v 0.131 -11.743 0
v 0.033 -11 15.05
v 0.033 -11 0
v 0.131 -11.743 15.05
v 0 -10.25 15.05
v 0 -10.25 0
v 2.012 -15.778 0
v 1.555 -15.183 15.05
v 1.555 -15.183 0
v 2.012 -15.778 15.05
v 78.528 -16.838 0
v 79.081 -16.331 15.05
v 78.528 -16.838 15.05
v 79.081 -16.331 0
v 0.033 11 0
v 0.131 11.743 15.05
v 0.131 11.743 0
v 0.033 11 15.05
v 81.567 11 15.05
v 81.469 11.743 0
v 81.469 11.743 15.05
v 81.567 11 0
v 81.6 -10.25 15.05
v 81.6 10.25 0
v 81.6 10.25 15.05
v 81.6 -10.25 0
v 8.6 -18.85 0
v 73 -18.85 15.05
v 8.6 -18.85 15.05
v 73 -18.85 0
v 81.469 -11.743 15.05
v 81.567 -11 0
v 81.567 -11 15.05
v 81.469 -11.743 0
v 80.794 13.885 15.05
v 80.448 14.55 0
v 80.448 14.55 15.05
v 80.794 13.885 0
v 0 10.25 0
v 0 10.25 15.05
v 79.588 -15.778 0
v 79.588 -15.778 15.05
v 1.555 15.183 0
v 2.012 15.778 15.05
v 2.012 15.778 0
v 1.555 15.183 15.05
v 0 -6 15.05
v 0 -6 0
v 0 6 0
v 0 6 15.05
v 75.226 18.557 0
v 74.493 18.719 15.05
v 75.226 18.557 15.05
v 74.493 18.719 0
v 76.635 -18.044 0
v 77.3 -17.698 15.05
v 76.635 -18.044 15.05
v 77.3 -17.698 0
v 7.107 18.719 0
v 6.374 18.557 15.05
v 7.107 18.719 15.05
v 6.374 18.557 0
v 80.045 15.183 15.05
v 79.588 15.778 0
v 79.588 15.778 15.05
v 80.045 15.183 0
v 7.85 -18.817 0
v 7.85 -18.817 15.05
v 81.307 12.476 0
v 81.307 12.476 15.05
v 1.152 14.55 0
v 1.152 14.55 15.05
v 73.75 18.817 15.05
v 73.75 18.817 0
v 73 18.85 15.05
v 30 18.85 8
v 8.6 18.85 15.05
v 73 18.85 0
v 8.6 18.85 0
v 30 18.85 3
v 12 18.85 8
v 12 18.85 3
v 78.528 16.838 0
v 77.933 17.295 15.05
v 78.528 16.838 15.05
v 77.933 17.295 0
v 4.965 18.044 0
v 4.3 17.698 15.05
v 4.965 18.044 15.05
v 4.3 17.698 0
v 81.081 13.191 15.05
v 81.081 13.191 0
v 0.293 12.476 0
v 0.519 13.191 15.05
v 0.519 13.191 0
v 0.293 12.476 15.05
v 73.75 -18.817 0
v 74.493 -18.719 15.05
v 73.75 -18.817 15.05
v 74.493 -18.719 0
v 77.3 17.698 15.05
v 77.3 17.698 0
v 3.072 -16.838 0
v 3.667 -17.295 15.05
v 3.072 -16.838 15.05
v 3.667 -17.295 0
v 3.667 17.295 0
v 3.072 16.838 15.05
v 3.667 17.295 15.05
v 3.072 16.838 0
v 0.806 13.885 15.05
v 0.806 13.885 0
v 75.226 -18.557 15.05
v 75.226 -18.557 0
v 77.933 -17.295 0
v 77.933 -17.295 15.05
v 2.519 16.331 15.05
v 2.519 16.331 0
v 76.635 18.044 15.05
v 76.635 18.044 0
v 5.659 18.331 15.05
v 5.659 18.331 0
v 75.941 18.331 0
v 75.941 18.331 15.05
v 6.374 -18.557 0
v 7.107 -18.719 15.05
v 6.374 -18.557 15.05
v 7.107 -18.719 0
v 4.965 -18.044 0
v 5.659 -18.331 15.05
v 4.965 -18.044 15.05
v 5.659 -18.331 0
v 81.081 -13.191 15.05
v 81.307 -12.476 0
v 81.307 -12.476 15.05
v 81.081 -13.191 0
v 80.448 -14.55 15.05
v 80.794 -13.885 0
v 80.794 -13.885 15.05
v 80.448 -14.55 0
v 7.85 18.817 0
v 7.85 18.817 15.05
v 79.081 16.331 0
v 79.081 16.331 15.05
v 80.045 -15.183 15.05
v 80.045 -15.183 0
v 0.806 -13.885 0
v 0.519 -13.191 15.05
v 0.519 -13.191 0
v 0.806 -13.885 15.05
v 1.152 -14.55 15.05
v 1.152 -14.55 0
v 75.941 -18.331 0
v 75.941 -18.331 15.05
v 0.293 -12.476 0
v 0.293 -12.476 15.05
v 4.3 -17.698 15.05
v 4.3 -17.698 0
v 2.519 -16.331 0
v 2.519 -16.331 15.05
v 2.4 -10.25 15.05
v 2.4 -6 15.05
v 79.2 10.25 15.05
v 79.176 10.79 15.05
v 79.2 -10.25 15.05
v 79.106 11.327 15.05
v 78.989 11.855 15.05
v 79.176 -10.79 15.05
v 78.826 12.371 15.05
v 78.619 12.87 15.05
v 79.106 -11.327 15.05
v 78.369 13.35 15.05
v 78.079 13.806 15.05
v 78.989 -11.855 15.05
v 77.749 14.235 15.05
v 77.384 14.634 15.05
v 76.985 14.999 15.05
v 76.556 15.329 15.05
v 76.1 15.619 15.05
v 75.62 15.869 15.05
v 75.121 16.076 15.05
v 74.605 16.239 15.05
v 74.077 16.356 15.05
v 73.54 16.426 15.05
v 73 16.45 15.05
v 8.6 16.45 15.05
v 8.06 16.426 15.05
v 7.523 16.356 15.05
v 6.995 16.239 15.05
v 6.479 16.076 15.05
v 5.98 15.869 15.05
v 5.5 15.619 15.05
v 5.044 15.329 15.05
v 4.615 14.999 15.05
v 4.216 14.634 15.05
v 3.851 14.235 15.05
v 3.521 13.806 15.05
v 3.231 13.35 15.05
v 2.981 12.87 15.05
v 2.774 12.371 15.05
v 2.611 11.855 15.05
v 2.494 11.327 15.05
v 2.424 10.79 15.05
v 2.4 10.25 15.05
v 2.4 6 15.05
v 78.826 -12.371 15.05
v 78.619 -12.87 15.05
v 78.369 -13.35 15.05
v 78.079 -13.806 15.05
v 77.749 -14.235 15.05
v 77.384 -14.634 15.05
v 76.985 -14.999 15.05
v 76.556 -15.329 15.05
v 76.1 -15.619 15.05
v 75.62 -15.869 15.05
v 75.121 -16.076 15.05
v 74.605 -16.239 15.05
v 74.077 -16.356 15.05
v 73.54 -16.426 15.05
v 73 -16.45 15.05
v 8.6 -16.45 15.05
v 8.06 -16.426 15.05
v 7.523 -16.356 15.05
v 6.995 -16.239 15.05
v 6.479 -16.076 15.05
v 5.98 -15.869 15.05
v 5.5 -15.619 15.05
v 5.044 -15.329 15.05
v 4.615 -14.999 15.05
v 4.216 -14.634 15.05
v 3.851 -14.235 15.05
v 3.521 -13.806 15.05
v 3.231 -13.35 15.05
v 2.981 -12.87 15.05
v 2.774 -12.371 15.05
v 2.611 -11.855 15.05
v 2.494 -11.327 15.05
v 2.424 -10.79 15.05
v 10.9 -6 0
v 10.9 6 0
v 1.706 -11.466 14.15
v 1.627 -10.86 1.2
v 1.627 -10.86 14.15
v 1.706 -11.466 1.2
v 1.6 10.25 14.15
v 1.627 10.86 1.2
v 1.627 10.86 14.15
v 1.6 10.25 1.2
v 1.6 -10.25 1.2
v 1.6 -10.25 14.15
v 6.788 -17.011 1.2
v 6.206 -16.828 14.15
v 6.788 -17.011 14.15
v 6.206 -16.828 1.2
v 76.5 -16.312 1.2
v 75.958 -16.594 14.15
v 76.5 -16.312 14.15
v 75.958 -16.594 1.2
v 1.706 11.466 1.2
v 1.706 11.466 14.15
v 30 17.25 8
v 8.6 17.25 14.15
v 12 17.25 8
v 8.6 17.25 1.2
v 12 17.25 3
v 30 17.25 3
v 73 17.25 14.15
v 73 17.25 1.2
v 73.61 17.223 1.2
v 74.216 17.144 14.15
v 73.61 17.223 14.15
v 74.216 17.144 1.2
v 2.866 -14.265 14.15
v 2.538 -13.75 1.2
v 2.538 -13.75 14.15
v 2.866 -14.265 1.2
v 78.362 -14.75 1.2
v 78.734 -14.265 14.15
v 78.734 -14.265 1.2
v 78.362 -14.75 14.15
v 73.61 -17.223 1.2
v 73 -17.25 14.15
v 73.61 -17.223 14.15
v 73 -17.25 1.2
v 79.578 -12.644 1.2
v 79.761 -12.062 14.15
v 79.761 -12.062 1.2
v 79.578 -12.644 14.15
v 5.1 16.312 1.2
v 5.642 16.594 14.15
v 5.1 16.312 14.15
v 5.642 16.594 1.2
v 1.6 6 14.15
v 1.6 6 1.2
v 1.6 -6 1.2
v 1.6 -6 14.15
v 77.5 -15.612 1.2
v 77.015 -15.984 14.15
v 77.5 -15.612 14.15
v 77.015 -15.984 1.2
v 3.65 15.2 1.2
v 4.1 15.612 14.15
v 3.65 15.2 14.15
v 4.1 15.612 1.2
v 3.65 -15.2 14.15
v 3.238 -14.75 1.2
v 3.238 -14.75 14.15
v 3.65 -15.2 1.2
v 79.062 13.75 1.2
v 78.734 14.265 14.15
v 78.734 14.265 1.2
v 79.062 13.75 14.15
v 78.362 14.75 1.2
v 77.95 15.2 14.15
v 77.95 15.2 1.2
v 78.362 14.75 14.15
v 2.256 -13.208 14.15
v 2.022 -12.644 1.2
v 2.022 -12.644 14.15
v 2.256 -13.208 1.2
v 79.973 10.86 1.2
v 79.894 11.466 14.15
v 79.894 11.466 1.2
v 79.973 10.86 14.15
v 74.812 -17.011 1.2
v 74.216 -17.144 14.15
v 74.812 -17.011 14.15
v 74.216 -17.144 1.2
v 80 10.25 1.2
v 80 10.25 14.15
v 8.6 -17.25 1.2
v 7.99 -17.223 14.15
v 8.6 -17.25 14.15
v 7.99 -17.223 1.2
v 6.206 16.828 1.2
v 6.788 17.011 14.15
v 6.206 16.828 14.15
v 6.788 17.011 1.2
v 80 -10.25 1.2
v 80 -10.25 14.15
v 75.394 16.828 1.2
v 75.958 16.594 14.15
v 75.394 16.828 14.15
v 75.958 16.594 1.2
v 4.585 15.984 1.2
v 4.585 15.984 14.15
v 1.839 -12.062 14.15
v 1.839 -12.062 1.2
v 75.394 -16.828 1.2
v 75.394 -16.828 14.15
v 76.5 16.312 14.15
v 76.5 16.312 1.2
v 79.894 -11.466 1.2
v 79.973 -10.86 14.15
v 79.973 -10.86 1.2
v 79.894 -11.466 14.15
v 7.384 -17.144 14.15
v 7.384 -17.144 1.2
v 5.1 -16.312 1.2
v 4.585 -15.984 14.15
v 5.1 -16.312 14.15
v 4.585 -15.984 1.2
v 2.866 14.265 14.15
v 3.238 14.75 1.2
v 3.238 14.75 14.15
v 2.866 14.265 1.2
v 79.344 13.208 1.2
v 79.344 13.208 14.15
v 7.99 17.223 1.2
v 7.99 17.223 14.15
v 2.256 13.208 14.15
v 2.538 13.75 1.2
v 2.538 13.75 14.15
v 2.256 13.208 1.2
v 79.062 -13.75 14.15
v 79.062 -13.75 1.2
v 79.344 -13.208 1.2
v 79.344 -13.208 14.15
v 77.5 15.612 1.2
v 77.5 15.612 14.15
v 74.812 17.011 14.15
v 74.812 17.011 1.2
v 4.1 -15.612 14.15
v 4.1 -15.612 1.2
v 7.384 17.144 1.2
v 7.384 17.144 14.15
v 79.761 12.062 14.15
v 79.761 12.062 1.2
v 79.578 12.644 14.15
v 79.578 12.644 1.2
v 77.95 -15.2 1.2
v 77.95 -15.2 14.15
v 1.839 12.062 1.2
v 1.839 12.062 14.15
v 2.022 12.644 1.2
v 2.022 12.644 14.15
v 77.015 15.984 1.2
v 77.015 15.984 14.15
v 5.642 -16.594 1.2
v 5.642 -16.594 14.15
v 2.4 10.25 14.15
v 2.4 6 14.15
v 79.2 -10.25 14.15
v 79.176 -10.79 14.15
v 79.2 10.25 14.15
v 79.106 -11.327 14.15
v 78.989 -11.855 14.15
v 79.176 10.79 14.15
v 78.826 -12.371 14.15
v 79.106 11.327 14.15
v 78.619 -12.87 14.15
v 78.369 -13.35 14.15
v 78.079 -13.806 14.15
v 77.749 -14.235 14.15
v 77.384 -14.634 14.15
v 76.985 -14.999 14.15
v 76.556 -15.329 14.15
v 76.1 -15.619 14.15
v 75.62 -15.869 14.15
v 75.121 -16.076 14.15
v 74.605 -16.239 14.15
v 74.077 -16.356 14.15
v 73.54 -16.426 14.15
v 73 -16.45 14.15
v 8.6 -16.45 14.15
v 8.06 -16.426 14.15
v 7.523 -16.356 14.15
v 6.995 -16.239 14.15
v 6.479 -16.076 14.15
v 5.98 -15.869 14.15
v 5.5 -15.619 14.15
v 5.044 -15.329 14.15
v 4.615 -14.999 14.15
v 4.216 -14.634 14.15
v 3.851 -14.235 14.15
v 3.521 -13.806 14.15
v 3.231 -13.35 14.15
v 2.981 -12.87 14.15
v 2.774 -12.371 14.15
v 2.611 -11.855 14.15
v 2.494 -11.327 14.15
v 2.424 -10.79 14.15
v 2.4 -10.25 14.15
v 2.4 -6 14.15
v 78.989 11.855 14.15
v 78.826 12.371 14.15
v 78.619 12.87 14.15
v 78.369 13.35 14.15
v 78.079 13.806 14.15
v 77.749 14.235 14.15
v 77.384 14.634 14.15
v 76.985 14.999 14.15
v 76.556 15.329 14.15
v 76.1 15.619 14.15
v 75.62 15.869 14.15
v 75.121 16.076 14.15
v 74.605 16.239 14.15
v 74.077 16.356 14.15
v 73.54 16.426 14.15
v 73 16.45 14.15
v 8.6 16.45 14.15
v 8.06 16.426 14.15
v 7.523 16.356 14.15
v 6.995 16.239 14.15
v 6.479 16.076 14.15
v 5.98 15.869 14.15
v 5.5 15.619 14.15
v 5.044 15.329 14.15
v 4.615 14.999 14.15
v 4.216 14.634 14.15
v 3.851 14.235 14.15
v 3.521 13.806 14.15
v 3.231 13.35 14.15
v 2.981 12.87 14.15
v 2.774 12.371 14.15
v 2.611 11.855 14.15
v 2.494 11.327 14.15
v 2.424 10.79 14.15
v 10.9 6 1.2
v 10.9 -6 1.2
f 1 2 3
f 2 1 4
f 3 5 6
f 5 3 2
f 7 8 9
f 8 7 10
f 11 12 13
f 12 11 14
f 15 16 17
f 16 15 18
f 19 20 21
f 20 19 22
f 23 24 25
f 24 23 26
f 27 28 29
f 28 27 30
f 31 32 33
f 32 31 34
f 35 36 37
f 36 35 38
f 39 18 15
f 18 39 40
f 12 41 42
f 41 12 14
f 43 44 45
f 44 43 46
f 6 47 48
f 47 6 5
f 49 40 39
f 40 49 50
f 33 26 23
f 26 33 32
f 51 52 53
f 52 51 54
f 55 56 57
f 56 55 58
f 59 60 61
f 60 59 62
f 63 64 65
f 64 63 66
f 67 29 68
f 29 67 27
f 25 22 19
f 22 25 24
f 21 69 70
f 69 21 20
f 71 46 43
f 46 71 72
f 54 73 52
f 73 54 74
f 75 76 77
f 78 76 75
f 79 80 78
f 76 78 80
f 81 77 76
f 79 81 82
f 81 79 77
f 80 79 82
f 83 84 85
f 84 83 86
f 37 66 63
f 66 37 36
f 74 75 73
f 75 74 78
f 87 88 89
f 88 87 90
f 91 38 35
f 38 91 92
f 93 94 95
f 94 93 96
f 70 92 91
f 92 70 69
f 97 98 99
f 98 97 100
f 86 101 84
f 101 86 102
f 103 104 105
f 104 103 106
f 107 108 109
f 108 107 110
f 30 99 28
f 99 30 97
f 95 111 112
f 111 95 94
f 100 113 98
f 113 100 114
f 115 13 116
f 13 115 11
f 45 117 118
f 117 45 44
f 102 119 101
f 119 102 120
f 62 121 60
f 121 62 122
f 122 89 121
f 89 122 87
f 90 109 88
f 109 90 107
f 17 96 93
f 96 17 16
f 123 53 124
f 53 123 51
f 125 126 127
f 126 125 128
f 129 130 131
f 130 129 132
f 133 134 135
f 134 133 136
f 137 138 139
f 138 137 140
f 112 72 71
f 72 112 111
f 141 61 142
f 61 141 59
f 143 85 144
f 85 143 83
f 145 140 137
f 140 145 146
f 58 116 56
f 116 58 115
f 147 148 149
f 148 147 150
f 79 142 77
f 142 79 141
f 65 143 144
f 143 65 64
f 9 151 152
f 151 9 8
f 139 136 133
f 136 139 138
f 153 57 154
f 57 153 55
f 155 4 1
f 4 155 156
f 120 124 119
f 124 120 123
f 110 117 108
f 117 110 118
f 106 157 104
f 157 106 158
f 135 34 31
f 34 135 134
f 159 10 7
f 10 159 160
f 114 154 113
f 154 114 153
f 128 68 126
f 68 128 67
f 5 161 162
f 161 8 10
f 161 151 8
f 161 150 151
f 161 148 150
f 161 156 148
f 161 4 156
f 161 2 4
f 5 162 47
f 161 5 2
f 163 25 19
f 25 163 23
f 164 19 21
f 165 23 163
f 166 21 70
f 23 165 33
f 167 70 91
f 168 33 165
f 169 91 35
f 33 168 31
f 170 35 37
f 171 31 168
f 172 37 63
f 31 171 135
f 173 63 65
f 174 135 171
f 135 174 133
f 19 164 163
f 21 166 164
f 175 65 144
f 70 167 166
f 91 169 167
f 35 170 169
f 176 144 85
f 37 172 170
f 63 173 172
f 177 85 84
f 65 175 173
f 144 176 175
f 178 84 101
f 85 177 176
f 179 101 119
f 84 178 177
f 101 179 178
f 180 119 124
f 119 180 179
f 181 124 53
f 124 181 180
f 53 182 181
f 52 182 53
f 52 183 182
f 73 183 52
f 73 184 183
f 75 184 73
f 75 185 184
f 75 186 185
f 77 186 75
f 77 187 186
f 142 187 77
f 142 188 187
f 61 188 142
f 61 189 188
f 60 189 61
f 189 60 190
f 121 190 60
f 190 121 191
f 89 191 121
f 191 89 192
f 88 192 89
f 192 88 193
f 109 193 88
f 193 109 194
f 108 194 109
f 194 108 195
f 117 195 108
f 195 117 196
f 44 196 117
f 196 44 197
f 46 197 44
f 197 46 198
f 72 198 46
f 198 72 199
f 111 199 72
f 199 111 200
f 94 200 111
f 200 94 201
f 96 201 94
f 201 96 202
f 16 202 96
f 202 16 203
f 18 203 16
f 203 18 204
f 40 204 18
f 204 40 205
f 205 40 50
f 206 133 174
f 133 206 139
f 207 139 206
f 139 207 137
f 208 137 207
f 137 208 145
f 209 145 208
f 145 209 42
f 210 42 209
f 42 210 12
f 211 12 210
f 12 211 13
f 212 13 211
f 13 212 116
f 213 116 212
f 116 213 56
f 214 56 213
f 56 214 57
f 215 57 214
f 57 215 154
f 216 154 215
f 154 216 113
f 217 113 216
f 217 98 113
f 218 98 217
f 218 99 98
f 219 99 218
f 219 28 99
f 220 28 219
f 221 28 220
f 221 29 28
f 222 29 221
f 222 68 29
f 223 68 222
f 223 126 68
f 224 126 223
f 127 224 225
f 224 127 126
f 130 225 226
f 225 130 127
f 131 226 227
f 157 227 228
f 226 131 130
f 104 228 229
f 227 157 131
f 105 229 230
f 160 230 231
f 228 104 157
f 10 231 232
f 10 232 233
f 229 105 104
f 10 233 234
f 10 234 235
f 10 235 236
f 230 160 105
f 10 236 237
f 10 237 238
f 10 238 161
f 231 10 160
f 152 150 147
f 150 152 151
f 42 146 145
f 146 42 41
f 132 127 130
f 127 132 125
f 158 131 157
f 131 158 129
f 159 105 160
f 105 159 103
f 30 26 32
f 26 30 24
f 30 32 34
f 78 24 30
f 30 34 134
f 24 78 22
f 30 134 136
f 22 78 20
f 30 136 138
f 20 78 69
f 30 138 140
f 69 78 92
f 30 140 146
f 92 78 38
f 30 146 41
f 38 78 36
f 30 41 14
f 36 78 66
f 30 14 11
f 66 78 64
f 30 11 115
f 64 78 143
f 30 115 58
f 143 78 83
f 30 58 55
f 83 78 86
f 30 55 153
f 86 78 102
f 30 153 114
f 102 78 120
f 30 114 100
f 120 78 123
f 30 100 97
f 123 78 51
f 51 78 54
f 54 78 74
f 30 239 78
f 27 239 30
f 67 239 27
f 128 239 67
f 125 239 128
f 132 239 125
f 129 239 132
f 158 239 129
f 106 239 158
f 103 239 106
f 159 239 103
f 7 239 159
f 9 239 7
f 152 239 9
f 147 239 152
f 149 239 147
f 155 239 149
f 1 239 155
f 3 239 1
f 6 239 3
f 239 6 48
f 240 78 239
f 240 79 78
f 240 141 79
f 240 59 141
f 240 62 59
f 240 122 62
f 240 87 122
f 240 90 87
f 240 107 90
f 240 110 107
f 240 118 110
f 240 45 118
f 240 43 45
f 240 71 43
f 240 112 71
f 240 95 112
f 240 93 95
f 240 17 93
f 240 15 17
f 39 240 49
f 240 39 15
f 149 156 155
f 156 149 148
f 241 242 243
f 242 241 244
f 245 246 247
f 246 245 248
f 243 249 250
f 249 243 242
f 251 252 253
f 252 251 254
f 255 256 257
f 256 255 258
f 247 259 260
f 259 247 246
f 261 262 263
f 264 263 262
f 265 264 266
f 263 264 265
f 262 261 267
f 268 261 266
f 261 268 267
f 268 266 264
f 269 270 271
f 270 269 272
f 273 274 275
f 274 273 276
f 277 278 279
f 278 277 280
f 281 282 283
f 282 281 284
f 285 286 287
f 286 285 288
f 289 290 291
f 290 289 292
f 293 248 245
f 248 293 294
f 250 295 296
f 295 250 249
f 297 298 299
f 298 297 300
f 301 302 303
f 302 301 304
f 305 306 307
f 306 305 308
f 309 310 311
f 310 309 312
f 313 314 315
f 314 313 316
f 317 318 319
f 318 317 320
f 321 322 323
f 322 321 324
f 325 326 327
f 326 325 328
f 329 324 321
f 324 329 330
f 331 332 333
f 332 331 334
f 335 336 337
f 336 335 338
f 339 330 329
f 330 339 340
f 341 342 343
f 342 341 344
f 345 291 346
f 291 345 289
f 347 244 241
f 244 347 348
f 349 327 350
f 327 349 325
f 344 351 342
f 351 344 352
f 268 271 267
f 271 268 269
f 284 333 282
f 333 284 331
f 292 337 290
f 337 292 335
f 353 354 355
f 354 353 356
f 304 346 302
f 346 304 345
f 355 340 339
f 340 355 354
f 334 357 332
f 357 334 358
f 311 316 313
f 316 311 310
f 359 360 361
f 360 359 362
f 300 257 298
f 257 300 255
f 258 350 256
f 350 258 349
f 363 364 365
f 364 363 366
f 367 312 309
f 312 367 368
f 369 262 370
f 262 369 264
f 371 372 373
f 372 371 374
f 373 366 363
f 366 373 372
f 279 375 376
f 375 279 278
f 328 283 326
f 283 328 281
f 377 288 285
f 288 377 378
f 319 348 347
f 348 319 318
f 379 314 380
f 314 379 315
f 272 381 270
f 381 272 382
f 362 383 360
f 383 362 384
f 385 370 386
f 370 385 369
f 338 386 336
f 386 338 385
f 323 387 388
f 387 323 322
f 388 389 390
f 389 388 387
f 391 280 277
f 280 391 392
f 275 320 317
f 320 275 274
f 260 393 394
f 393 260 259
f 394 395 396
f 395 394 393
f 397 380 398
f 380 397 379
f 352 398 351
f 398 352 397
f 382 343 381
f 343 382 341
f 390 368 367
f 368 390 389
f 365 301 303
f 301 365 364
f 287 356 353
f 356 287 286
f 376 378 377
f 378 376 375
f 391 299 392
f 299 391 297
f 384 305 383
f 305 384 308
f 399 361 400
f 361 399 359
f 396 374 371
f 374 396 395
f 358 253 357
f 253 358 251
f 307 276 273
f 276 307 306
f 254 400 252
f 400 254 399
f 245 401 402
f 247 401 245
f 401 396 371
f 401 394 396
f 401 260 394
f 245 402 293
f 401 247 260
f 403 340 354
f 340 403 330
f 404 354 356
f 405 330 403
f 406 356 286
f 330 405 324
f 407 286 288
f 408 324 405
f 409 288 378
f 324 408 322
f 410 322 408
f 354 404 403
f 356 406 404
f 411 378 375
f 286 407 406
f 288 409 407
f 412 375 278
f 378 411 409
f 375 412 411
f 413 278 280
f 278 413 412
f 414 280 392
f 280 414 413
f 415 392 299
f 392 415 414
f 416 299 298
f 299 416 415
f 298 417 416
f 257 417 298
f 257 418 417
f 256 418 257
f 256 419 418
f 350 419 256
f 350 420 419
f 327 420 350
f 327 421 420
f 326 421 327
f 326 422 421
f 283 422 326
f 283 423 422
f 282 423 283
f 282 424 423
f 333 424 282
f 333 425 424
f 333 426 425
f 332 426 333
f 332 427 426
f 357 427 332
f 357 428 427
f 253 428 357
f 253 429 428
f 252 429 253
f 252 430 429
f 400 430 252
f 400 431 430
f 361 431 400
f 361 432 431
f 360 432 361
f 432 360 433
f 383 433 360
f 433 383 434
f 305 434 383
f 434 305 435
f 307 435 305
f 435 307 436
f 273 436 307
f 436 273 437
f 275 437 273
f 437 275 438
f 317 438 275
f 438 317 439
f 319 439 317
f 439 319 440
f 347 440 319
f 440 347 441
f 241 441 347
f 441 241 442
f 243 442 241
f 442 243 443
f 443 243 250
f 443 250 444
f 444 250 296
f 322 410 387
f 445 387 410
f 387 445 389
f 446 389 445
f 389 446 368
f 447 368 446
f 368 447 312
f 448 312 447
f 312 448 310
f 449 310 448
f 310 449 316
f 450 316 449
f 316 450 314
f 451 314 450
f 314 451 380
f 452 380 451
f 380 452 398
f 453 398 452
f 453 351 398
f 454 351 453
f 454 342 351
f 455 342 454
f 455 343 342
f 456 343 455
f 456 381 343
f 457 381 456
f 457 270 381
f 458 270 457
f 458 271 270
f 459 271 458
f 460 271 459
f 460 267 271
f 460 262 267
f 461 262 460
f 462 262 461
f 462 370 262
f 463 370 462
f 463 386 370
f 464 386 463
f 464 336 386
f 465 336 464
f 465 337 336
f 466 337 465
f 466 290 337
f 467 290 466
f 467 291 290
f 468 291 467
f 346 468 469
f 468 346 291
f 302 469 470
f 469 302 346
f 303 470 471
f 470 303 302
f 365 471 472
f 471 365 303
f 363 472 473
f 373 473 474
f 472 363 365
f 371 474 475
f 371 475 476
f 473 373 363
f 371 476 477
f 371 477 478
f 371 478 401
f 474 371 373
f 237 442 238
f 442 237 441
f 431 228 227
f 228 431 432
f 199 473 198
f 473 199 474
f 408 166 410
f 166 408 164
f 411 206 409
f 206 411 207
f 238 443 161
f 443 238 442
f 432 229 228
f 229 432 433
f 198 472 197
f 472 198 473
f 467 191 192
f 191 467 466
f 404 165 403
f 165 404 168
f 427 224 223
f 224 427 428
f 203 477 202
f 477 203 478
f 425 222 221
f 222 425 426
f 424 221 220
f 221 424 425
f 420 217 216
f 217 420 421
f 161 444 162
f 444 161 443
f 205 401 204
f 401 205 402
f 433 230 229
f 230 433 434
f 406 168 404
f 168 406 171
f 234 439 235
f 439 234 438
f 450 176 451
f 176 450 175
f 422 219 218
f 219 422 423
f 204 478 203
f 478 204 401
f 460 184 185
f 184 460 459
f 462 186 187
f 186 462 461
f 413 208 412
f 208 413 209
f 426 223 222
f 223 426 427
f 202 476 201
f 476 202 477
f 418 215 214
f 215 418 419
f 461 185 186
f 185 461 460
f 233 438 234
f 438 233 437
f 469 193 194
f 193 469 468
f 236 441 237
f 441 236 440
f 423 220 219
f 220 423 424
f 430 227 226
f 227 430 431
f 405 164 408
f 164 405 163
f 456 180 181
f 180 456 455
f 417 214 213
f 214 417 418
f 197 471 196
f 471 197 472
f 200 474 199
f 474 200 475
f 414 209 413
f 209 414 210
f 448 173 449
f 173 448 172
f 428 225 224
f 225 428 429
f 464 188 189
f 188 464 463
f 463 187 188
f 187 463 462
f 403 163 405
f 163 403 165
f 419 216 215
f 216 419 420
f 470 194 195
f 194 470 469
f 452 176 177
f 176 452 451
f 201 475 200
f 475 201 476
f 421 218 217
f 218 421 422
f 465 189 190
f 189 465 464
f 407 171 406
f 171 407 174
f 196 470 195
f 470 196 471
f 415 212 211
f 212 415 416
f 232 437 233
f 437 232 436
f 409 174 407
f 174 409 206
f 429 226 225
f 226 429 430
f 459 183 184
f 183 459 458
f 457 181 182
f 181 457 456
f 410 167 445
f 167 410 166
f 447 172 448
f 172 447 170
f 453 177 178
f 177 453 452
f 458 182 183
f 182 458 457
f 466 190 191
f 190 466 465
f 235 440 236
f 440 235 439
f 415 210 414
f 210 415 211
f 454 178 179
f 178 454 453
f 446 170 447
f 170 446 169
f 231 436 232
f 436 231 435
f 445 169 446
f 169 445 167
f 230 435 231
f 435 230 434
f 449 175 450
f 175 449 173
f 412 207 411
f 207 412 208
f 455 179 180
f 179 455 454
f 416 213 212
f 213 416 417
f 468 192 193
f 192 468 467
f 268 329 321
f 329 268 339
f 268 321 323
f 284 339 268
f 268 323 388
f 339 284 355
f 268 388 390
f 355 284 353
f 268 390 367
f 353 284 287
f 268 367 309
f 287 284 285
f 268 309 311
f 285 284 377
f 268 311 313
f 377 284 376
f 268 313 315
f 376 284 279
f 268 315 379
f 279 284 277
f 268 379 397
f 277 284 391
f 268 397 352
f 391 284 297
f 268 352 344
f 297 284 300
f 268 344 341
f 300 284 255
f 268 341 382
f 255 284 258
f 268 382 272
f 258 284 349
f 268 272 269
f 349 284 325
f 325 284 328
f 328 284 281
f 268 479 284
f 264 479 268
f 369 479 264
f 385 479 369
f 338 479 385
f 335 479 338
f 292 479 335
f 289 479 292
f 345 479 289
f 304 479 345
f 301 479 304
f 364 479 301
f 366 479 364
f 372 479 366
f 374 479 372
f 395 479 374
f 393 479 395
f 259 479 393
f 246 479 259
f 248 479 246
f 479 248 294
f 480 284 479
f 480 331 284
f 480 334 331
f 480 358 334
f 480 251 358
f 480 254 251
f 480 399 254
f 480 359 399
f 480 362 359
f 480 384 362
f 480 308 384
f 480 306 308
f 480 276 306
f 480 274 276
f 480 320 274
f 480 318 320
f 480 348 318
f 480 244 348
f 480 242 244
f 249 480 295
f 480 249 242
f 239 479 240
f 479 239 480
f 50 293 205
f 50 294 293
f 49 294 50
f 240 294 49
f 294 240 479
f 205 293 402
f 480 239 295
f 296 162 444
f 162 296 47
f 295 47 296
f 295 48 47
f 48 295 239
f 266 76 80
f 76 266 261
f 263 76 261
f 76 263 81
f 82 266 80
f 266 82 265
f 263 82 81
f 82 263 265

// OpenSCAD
// BYD YUAN PRO — bumper protetor em TPU
// V0.1 PARAMÉTRICA — face frontal aberta, traseira e laterais protegidas.
// A BYD não publicou desenho dimensional da chave nas fontes consultadas.
// X = comprimento; Y = largura; Z = espessura.

$fn = 72;
MODEL_NAME = "BYD YUAN PRO";

// Medidas provisórias — substituir por medição da chave física
KEY_L = 78.0;       // X, mm
KEY_W = 34.0;       // Y, mm
KEY_T = 14.5;       // Z, mm
KEY_R = 7.0;

// Folgas e paredes TPU
CLR_X = 0.40;
CLR_Y = 0.25;
CLR_Z = 0.35;
BACK = 1.20;
SIDE_WALL = 1.60;
FACE_CLEARANCE = 1.00;
LIP_IN = 0.80;
LIP_H = 0.90;

// Abertura para argola/cinta; conferir se a chave do veículo possui esta interface.
RING_NOTCH_L = 11.0;
RING_NOTCH_W = 12.0;

// Como a forma da chave do Yuan Pro pode variar por mercado/versão, a abertura é ajustável.
MECH_SLOT = true;
MECH_SLOT_X = 12.0;
MECH_SLOT_L = 18.0;
MECH_SLOT_Z = 3.0;
MECH_SLOT_H = 5.0;
MECH_SLOT_SIDE = 1;

INNER_L = KEY_L + CLR_X;
INNER_W = KEY_W + 2*CLR_Y;
INNER_T = KEY_T + CLR_Z;
OUTER_L = INNER_L + 2*SIDE_WALL;
OUTER_W = INNER_W + 2*SIDE_WALL;
WALL_H = max(1.0, INNER_T - FACE_CLEARANCE);
OUTER_H = BACK + WALL_H;
OUTER_R = min(KEY_R + SIDE_WALL, OUTER_W/2 - 0.30);
INNER_R = min(KEY_R, INNER_W/2 - 0.30);

module rounded2d(l,w,r) {
    hull() {
        for (x=[r,l-r])
            for (y=[-w/2+r,w/2-r])
                translate([x,y]) circle(r=r);
    }
}
module rounded_prism(l,w,h,r) { linear_extrude(height=h) rounded2d(l,w,r); }
module base_plate() { rounded_prism(OUTER_L,OUTER_W,BACK,OUTER_R); }
module side_ring() {
    difference() {
        rounded_prism(OUTER_L,OUTER_W,OUTER_H,OUTER_R);
        translate([SIDE_WALL,0,BACK-0.05]) rounded_prism(INNER_L,INNER_W,WALL_H+0.20,INNER_R);
    }
}
module retention_lip() {
    difference() {
        translate([0,0,BACK+WALL_H-LIP_H]) rounded_prism(OUTER_L,OUTER_W,LIP_H,OUTER_R);
        translate([SIDE_WALL+LIP_IN,0,BACK+WALL_H-LIP_H-0.05])
            rounded_prism(INNER_L-2*LIP_IN,INNER_W-2*LIP_IN,LIP_H+0.20,max(0.5,INNER_R-LIP_IN));
    }
}
module ring_notch() {
    translate([-0.10,-RING_NOTCH_W/2,-0.10]) cube([RING_NOTCH_L,RING_NOTCH_W,OUTER_H+0.30]);
}
module mechanical_slot() {
    if (MECH_SLOT) {
        y0 = MECH_SLOT_SIDE > 0 ? OUTER_W/2-SIDE_WALL-0.10 : -OUTER_W/2+0.10;
        translate([MECH_SLOT_X,y0,MECH_SLOT_Z]) cube([MECH_SLOT_L,SIDE_WALL+0.40,MECH_SLOT_H]);
    }
}
module bumper() {
    difference() {
        union() { base_plate(); side_ring(); retention_lip(); }
        ring_notch();
        mechanical_slot();
    }
}

bumper();

// Confirmar na chave real: quantidade de botões, indicador, chave mecânica e argola.
// A face dos comandos permanece aberta por projeto.
